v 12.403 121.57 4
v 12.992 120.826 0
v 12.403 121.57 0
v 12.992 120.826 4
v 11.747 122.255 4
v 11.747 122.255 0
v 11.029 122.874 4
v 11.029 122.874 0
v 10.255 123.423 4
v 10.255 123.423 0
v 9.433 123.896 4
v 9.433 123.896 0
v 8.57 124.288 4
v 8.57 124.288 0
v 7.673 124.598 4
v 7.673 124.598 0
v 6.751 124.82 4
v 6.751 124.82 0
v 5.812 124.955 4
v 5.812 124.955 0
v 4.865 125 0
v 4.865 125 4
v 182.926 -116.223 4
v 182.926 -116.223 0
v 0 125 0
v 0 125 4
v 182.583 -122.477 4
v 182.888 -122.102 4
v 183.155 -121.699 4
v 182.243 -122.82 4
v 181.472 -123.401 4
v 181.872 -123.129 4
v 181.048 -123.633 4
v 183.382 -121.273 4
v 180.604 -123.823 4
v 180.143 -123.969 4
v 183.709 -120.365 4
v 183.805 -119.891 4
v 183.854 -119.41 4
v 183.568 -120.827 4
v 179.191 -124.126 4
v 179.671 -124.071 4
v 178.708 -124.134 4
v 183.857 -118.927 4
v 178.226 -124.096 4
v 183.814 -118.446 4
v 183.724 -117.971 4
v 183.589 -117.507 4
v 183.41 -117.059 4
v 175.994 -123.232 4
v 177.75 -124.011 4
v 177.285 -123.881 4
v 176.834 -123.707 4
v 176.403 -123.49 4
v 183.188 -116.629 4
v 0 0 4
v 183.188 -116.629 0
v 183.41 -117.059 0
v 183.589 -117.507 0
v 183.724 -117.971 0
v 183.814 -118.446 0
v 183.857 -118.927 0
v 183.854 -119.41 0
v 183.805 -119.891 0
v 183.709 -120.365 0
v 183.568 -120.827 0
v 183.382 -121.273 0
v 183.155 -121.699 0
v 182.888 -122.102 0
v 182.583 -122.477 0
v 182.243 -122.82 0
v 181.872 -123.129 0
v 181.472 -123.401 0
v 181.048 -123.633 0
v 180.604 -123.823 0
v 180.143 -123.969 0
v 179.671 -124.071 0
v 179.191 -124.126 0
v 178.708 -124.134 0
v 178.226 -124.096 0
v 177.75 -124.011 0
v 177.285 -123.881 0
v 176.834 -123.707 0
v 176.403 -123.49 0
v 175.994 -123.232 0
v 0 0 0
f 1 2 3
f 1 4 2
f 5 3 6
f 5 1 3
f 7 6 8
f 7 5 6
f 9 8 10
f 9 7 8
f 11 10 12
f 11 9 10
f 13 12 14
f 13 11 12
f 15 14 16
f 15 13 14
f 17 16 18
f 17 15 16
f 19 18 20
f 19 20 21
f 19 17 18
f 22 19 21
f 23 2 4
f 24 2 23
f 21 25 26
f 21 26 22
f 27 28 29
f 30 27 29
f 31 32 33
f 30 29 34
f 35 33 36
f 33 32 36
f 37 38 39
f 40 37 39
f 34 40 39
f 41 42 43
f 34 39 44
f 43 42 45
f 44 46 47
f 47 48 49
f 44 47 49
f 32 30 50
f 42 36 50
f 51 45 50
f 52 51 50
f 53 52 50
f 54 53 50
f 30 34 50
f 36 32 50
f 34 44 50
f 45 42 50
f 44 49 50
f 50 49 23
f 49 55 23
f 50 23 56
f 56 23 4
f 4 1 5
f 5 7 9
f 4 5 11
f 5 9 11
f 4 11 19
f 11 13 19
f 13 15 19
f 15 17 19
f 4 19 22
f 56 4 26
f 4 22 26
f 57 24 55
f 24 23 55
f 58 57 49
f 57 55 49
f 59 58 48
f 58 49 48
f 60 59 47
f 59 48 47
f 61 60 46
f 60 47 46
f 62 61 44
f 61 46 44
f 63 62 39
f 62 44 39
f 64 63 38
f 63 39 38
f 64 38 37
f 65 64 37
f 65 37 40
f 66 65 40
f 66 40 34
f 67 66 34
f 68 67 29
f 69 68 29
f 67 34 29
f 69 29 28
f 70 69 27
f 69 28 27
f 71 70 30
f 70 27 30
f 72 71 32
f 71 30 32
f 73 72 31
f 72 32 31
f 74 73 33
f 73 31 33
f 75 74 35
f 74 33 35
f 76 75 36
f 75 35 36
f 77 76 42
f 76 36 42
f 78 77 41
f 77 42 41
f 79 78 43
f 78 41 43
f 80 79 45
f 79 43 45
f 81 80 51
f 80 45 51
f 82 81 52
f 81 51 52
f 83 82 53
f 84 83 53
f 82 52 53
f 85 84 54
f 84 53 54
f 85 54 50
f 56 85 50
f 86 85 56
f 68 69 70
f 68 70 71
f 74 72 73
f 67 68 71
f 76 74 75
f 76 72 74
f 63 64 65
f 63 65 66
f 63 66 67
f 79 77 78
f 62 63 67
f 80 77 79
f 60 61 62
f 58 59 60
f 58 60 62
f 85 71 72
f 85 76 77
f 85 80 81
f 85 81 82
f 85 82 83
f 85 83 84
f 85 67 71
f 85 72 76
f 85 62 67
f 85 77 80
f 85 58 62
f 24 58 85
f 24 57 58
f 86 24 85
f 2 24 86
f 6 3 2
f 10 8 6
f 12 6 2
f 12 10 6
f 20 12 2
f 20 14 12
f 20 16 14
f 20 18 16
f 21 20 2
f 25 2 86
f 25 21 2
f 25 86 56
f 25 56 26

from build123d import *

# Parameters (mm, degrees)
EXTRUDE_1_DEPTH = 4
FILLET_1_R      = 5
FILLET_2_R      = 10


with BuildPart() as part:
    # Эскиз1 → Бобышка-Вытянуть1 (new body)
    with BuildSketch(Plane.XY):
        Polygon((0, 0), (0, 125), (10, 125), (200, -140.041507642), align=None)
    extrude(amount=EXTRUDE_1_DEPTH)

    # Скругление1
    fillet_1_edges = [part.edges().sort_by_distance(p)[0] for p in [
        (200, -140.041507642, 2),
    ]]
    fillet(fillet_1_edges, radius=FILLET_1_R)

    # Скругление2
    fillet_2_edges = [part.edges().sort_by_distance(p)[0] for p in [
        (10, 125, 2),
    ]]
    fillet(fillet_2_edges, radius=FILLET_2_R)


solid = part.part
